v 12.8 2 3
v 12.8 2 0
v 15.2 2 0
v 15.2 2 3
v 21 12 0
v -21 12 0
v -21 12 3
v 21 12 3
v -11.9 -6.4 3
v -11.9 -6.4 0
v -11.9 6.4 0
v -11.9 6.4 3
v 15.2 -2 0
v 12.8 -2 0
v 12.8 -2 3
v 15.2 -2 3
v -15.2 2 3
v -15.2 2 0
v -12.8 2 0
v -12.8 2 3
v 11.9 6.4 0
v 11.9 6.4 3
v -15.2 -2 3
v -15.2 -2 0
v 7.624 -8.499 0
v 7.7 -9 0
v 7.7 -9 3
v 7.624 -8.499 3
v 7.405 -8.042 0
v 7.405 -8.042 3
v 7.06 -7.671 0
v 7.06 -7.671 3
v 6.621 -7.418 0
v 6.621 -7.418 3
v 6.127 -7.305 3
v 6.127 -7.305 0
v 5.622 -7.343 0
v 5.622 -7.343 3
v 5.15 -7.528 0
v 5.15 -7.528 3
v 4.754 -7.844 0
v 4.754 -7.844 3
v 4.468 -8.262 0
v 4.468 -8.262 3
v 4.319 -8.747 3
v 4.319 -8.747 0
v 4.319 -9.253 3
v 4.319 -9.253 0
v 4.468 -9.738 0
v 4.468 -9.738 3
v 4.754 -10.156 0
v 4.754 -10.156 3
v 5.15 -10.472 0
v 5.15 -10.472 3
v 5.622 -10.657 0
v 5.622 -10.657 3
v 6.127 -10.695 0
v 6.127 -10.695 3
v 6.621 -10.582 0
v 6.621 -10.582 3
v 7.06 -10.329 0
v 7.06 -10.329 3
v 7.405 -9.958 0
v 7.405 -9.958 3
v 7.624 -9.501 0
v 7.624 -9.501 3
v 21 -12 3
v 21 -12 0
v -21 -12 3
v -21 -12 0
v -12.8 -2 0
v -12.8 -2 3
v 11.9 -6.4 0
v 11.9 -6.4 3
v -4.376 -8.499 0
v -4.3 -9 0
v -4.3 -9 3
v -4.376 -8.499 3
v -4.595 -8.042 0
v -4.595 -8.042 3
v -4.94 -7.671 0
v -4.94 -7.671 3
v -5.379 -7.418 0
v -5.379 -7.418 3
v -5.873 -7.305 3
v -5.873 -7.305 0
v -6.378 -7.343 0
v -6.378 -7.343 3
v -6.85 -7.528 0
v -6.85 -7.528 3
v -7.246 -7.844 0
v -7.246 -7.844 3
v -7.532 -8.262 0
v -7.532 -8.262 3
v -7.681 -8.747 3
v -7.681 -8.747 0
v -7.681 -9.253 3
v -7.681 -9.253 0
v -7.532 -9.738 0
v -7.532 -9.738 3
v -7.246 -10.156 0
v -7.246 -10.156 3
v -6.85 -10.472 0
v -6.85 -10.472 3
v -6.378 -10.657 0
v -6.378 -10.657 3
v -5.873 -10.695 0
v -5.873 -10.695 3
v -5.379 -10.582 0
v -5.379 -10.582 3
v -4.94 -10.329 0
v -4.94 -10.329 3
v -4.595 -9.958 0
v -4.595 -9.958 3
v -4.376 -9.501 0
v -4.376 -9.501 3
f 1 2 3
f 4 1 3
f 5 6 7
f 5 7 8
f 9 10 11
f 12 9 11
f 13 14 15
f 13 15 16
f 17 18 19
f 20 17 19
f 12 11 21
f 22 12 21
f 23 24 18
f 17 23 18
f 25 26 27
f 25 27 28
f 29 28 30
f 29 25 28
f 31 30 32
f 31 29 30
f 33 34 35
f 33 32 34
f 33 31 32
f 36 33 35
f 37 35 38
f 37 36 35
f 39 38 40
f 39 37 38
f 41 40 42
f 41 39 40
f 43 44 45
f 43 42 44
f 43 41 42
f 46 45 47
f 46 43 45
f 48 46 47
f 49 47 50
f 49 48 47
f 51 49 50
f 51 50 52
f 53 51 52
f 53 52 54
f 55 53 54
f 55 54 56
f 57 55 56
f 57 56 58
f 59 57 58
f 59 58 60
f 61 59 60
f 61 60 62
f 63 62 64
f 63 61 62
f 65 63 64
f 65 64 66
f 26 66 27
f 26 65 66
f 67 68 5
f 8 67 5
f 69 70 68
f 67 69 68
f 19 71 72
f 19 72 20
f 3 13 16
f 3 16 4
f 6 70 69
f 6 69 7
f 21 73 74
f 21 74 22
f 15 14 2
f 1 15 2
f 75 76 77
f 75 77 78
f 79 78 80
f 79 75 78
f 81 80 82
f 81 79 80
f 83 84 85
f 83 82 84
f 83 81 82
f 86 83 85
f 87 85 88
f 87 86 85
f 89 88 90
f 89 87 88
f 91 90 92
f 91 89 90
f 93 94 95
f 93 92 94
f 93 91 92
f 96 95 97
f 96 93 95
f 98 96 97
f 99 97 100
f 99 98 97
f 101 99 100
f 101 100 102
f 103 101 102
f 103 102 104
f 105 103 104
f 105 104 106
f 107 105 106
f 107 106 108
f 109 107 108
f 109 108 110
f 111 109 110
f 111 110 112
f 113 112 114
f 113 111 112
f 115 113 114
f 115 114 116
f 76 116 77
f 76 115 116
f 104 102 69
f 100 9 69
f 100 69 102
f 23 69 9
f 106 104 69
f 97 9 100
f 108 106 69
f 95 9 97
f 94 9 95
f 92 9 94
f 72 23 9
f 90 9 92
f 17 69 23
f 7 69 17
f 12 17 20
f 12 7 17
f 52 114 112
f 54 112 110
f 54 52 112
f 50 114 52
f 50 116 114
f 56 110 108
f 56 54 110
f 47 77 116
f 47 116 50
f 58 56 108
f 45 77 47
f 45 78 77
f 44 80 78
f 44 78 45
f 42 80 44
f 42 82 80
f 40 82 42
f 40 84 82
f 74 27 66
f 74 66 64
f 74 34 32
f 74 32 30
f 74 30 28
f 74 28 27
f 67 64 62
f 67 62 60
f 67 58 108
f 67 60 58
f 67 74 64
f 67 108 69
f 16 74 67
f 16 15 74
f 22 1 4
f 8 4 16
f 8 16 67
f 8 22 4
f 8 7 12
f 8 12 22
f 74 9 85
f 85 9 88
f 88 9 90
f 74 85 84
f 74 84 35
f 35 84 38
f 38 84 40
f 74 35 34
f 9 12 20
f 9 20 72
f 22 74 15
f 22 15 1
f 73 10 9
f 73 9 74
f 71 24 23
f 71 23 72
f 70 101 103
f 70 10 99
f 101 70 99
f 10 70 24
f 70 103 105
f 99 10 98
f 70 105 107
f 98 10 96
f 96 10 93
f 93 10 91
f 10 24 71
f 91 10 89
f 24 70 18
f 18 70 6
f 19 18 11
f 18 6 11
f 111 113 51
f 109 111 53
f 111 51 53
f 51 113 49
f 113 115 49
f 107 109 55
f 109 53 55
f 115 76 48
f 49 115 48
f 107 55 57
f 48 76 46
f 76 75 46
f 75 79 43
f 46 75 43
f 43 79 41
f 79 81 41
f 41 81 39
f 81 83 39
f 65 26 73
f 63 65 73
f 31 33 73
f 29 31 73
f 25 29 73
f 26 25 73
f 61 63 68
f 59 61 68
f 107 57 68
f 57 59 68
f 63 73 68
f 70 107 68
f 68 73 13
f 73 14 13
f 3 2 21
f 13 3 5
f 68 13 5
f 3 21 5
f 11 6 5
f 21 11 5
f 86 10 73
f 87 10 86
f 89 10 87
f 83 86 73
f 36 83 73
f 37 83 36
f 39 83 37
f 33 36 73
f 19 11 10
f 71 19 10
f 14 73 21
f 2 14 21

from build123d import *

# Parameters (mm, degrees)
SKETCH_1_W                             = 42
SKETCH_1_H                             = 24
SKETCH_1_W_2                           = 23.8
SKETCH_1_H_2                           = 12.8
SG90_WINDOW23P8X12P8_DEPTH             = 3
SG90_MOUNT_SLOTS_REFERENCE_DEPTH       = 25.372115214
SG90_MOUNT_SLOTS_REFERENCE_DEPTH_BACK  = 25.372115214
SKETCH_2_W                             = 2.4
SKETCH_2_H                             = 4
ADAPTER_M3_PAIR12_REFERENCE_DEPTH      = 25.372115214
ADAPTER_M3_PAIR12_REFERENCE_DEPTH_BACK = 25.372115214
SKETCH_3_R                             = 1.7


with BuildPart() as part:
    # 草图1 → SG90_window23p8x12p8 (new body)
    with BuildSketch(Plane.XY):
        Rectangle(SKETCH_1_W, SKETCH_1_H)
        Rectangle(SKETCH_1_W_2, SKETCH_1_H_2, mode=Mode.SUBTRACT)
    extrude(amount=SG90_WINDOW23P8X12P8_DEPTH)

    # 草图2 → SG90_mount_slots_REFERENCE (cut, two sides: drawn at the far end of the back side and taken through both)
    with BuildSketch(Plane.XY.offset(-SG90_MOUNT_SLOTS_REFERENCE_DEPTH_BACK)):
        with Locations((-14, 0)):
            Rectangle(SKETCH_2_W, SKETCH_2_H)
        with Locations((14, 0)):
            Rectangle(SKETCH_2_W, SKETCH_2_H)
    extrude(amount=SG90_MOUNT_SLOTS_REFERENCE_DEPTH + SG90_MOUNT_SLOTS_REFERENCE_DEPTH_BACK, mode=Mode.SUBTRACT)

    # 草图3 → Adapter_M3_pair12_REFERENCE (cut, two sides: drawn at the far end of the back side and taken through both)
    with BuildSketch(Plane.XY.offset(-ADAPTER_M3_PAIR12_REFERENCE_DEPTH_BACK)):
        with Locations((-6, -9)):
            Circle(SKETCH_3_R)
        with Locations((6, -9)):
            Circle(SKETCH_3_R)
    extrude(amount=ADAPTER_M3_PAIR12_REFERENCE_DEPTH + ADAPTER_M3_PAIR12_REFERENCE_DEPTH_BACK, mode=Mode.SUBTRACT)


solid = part.part
